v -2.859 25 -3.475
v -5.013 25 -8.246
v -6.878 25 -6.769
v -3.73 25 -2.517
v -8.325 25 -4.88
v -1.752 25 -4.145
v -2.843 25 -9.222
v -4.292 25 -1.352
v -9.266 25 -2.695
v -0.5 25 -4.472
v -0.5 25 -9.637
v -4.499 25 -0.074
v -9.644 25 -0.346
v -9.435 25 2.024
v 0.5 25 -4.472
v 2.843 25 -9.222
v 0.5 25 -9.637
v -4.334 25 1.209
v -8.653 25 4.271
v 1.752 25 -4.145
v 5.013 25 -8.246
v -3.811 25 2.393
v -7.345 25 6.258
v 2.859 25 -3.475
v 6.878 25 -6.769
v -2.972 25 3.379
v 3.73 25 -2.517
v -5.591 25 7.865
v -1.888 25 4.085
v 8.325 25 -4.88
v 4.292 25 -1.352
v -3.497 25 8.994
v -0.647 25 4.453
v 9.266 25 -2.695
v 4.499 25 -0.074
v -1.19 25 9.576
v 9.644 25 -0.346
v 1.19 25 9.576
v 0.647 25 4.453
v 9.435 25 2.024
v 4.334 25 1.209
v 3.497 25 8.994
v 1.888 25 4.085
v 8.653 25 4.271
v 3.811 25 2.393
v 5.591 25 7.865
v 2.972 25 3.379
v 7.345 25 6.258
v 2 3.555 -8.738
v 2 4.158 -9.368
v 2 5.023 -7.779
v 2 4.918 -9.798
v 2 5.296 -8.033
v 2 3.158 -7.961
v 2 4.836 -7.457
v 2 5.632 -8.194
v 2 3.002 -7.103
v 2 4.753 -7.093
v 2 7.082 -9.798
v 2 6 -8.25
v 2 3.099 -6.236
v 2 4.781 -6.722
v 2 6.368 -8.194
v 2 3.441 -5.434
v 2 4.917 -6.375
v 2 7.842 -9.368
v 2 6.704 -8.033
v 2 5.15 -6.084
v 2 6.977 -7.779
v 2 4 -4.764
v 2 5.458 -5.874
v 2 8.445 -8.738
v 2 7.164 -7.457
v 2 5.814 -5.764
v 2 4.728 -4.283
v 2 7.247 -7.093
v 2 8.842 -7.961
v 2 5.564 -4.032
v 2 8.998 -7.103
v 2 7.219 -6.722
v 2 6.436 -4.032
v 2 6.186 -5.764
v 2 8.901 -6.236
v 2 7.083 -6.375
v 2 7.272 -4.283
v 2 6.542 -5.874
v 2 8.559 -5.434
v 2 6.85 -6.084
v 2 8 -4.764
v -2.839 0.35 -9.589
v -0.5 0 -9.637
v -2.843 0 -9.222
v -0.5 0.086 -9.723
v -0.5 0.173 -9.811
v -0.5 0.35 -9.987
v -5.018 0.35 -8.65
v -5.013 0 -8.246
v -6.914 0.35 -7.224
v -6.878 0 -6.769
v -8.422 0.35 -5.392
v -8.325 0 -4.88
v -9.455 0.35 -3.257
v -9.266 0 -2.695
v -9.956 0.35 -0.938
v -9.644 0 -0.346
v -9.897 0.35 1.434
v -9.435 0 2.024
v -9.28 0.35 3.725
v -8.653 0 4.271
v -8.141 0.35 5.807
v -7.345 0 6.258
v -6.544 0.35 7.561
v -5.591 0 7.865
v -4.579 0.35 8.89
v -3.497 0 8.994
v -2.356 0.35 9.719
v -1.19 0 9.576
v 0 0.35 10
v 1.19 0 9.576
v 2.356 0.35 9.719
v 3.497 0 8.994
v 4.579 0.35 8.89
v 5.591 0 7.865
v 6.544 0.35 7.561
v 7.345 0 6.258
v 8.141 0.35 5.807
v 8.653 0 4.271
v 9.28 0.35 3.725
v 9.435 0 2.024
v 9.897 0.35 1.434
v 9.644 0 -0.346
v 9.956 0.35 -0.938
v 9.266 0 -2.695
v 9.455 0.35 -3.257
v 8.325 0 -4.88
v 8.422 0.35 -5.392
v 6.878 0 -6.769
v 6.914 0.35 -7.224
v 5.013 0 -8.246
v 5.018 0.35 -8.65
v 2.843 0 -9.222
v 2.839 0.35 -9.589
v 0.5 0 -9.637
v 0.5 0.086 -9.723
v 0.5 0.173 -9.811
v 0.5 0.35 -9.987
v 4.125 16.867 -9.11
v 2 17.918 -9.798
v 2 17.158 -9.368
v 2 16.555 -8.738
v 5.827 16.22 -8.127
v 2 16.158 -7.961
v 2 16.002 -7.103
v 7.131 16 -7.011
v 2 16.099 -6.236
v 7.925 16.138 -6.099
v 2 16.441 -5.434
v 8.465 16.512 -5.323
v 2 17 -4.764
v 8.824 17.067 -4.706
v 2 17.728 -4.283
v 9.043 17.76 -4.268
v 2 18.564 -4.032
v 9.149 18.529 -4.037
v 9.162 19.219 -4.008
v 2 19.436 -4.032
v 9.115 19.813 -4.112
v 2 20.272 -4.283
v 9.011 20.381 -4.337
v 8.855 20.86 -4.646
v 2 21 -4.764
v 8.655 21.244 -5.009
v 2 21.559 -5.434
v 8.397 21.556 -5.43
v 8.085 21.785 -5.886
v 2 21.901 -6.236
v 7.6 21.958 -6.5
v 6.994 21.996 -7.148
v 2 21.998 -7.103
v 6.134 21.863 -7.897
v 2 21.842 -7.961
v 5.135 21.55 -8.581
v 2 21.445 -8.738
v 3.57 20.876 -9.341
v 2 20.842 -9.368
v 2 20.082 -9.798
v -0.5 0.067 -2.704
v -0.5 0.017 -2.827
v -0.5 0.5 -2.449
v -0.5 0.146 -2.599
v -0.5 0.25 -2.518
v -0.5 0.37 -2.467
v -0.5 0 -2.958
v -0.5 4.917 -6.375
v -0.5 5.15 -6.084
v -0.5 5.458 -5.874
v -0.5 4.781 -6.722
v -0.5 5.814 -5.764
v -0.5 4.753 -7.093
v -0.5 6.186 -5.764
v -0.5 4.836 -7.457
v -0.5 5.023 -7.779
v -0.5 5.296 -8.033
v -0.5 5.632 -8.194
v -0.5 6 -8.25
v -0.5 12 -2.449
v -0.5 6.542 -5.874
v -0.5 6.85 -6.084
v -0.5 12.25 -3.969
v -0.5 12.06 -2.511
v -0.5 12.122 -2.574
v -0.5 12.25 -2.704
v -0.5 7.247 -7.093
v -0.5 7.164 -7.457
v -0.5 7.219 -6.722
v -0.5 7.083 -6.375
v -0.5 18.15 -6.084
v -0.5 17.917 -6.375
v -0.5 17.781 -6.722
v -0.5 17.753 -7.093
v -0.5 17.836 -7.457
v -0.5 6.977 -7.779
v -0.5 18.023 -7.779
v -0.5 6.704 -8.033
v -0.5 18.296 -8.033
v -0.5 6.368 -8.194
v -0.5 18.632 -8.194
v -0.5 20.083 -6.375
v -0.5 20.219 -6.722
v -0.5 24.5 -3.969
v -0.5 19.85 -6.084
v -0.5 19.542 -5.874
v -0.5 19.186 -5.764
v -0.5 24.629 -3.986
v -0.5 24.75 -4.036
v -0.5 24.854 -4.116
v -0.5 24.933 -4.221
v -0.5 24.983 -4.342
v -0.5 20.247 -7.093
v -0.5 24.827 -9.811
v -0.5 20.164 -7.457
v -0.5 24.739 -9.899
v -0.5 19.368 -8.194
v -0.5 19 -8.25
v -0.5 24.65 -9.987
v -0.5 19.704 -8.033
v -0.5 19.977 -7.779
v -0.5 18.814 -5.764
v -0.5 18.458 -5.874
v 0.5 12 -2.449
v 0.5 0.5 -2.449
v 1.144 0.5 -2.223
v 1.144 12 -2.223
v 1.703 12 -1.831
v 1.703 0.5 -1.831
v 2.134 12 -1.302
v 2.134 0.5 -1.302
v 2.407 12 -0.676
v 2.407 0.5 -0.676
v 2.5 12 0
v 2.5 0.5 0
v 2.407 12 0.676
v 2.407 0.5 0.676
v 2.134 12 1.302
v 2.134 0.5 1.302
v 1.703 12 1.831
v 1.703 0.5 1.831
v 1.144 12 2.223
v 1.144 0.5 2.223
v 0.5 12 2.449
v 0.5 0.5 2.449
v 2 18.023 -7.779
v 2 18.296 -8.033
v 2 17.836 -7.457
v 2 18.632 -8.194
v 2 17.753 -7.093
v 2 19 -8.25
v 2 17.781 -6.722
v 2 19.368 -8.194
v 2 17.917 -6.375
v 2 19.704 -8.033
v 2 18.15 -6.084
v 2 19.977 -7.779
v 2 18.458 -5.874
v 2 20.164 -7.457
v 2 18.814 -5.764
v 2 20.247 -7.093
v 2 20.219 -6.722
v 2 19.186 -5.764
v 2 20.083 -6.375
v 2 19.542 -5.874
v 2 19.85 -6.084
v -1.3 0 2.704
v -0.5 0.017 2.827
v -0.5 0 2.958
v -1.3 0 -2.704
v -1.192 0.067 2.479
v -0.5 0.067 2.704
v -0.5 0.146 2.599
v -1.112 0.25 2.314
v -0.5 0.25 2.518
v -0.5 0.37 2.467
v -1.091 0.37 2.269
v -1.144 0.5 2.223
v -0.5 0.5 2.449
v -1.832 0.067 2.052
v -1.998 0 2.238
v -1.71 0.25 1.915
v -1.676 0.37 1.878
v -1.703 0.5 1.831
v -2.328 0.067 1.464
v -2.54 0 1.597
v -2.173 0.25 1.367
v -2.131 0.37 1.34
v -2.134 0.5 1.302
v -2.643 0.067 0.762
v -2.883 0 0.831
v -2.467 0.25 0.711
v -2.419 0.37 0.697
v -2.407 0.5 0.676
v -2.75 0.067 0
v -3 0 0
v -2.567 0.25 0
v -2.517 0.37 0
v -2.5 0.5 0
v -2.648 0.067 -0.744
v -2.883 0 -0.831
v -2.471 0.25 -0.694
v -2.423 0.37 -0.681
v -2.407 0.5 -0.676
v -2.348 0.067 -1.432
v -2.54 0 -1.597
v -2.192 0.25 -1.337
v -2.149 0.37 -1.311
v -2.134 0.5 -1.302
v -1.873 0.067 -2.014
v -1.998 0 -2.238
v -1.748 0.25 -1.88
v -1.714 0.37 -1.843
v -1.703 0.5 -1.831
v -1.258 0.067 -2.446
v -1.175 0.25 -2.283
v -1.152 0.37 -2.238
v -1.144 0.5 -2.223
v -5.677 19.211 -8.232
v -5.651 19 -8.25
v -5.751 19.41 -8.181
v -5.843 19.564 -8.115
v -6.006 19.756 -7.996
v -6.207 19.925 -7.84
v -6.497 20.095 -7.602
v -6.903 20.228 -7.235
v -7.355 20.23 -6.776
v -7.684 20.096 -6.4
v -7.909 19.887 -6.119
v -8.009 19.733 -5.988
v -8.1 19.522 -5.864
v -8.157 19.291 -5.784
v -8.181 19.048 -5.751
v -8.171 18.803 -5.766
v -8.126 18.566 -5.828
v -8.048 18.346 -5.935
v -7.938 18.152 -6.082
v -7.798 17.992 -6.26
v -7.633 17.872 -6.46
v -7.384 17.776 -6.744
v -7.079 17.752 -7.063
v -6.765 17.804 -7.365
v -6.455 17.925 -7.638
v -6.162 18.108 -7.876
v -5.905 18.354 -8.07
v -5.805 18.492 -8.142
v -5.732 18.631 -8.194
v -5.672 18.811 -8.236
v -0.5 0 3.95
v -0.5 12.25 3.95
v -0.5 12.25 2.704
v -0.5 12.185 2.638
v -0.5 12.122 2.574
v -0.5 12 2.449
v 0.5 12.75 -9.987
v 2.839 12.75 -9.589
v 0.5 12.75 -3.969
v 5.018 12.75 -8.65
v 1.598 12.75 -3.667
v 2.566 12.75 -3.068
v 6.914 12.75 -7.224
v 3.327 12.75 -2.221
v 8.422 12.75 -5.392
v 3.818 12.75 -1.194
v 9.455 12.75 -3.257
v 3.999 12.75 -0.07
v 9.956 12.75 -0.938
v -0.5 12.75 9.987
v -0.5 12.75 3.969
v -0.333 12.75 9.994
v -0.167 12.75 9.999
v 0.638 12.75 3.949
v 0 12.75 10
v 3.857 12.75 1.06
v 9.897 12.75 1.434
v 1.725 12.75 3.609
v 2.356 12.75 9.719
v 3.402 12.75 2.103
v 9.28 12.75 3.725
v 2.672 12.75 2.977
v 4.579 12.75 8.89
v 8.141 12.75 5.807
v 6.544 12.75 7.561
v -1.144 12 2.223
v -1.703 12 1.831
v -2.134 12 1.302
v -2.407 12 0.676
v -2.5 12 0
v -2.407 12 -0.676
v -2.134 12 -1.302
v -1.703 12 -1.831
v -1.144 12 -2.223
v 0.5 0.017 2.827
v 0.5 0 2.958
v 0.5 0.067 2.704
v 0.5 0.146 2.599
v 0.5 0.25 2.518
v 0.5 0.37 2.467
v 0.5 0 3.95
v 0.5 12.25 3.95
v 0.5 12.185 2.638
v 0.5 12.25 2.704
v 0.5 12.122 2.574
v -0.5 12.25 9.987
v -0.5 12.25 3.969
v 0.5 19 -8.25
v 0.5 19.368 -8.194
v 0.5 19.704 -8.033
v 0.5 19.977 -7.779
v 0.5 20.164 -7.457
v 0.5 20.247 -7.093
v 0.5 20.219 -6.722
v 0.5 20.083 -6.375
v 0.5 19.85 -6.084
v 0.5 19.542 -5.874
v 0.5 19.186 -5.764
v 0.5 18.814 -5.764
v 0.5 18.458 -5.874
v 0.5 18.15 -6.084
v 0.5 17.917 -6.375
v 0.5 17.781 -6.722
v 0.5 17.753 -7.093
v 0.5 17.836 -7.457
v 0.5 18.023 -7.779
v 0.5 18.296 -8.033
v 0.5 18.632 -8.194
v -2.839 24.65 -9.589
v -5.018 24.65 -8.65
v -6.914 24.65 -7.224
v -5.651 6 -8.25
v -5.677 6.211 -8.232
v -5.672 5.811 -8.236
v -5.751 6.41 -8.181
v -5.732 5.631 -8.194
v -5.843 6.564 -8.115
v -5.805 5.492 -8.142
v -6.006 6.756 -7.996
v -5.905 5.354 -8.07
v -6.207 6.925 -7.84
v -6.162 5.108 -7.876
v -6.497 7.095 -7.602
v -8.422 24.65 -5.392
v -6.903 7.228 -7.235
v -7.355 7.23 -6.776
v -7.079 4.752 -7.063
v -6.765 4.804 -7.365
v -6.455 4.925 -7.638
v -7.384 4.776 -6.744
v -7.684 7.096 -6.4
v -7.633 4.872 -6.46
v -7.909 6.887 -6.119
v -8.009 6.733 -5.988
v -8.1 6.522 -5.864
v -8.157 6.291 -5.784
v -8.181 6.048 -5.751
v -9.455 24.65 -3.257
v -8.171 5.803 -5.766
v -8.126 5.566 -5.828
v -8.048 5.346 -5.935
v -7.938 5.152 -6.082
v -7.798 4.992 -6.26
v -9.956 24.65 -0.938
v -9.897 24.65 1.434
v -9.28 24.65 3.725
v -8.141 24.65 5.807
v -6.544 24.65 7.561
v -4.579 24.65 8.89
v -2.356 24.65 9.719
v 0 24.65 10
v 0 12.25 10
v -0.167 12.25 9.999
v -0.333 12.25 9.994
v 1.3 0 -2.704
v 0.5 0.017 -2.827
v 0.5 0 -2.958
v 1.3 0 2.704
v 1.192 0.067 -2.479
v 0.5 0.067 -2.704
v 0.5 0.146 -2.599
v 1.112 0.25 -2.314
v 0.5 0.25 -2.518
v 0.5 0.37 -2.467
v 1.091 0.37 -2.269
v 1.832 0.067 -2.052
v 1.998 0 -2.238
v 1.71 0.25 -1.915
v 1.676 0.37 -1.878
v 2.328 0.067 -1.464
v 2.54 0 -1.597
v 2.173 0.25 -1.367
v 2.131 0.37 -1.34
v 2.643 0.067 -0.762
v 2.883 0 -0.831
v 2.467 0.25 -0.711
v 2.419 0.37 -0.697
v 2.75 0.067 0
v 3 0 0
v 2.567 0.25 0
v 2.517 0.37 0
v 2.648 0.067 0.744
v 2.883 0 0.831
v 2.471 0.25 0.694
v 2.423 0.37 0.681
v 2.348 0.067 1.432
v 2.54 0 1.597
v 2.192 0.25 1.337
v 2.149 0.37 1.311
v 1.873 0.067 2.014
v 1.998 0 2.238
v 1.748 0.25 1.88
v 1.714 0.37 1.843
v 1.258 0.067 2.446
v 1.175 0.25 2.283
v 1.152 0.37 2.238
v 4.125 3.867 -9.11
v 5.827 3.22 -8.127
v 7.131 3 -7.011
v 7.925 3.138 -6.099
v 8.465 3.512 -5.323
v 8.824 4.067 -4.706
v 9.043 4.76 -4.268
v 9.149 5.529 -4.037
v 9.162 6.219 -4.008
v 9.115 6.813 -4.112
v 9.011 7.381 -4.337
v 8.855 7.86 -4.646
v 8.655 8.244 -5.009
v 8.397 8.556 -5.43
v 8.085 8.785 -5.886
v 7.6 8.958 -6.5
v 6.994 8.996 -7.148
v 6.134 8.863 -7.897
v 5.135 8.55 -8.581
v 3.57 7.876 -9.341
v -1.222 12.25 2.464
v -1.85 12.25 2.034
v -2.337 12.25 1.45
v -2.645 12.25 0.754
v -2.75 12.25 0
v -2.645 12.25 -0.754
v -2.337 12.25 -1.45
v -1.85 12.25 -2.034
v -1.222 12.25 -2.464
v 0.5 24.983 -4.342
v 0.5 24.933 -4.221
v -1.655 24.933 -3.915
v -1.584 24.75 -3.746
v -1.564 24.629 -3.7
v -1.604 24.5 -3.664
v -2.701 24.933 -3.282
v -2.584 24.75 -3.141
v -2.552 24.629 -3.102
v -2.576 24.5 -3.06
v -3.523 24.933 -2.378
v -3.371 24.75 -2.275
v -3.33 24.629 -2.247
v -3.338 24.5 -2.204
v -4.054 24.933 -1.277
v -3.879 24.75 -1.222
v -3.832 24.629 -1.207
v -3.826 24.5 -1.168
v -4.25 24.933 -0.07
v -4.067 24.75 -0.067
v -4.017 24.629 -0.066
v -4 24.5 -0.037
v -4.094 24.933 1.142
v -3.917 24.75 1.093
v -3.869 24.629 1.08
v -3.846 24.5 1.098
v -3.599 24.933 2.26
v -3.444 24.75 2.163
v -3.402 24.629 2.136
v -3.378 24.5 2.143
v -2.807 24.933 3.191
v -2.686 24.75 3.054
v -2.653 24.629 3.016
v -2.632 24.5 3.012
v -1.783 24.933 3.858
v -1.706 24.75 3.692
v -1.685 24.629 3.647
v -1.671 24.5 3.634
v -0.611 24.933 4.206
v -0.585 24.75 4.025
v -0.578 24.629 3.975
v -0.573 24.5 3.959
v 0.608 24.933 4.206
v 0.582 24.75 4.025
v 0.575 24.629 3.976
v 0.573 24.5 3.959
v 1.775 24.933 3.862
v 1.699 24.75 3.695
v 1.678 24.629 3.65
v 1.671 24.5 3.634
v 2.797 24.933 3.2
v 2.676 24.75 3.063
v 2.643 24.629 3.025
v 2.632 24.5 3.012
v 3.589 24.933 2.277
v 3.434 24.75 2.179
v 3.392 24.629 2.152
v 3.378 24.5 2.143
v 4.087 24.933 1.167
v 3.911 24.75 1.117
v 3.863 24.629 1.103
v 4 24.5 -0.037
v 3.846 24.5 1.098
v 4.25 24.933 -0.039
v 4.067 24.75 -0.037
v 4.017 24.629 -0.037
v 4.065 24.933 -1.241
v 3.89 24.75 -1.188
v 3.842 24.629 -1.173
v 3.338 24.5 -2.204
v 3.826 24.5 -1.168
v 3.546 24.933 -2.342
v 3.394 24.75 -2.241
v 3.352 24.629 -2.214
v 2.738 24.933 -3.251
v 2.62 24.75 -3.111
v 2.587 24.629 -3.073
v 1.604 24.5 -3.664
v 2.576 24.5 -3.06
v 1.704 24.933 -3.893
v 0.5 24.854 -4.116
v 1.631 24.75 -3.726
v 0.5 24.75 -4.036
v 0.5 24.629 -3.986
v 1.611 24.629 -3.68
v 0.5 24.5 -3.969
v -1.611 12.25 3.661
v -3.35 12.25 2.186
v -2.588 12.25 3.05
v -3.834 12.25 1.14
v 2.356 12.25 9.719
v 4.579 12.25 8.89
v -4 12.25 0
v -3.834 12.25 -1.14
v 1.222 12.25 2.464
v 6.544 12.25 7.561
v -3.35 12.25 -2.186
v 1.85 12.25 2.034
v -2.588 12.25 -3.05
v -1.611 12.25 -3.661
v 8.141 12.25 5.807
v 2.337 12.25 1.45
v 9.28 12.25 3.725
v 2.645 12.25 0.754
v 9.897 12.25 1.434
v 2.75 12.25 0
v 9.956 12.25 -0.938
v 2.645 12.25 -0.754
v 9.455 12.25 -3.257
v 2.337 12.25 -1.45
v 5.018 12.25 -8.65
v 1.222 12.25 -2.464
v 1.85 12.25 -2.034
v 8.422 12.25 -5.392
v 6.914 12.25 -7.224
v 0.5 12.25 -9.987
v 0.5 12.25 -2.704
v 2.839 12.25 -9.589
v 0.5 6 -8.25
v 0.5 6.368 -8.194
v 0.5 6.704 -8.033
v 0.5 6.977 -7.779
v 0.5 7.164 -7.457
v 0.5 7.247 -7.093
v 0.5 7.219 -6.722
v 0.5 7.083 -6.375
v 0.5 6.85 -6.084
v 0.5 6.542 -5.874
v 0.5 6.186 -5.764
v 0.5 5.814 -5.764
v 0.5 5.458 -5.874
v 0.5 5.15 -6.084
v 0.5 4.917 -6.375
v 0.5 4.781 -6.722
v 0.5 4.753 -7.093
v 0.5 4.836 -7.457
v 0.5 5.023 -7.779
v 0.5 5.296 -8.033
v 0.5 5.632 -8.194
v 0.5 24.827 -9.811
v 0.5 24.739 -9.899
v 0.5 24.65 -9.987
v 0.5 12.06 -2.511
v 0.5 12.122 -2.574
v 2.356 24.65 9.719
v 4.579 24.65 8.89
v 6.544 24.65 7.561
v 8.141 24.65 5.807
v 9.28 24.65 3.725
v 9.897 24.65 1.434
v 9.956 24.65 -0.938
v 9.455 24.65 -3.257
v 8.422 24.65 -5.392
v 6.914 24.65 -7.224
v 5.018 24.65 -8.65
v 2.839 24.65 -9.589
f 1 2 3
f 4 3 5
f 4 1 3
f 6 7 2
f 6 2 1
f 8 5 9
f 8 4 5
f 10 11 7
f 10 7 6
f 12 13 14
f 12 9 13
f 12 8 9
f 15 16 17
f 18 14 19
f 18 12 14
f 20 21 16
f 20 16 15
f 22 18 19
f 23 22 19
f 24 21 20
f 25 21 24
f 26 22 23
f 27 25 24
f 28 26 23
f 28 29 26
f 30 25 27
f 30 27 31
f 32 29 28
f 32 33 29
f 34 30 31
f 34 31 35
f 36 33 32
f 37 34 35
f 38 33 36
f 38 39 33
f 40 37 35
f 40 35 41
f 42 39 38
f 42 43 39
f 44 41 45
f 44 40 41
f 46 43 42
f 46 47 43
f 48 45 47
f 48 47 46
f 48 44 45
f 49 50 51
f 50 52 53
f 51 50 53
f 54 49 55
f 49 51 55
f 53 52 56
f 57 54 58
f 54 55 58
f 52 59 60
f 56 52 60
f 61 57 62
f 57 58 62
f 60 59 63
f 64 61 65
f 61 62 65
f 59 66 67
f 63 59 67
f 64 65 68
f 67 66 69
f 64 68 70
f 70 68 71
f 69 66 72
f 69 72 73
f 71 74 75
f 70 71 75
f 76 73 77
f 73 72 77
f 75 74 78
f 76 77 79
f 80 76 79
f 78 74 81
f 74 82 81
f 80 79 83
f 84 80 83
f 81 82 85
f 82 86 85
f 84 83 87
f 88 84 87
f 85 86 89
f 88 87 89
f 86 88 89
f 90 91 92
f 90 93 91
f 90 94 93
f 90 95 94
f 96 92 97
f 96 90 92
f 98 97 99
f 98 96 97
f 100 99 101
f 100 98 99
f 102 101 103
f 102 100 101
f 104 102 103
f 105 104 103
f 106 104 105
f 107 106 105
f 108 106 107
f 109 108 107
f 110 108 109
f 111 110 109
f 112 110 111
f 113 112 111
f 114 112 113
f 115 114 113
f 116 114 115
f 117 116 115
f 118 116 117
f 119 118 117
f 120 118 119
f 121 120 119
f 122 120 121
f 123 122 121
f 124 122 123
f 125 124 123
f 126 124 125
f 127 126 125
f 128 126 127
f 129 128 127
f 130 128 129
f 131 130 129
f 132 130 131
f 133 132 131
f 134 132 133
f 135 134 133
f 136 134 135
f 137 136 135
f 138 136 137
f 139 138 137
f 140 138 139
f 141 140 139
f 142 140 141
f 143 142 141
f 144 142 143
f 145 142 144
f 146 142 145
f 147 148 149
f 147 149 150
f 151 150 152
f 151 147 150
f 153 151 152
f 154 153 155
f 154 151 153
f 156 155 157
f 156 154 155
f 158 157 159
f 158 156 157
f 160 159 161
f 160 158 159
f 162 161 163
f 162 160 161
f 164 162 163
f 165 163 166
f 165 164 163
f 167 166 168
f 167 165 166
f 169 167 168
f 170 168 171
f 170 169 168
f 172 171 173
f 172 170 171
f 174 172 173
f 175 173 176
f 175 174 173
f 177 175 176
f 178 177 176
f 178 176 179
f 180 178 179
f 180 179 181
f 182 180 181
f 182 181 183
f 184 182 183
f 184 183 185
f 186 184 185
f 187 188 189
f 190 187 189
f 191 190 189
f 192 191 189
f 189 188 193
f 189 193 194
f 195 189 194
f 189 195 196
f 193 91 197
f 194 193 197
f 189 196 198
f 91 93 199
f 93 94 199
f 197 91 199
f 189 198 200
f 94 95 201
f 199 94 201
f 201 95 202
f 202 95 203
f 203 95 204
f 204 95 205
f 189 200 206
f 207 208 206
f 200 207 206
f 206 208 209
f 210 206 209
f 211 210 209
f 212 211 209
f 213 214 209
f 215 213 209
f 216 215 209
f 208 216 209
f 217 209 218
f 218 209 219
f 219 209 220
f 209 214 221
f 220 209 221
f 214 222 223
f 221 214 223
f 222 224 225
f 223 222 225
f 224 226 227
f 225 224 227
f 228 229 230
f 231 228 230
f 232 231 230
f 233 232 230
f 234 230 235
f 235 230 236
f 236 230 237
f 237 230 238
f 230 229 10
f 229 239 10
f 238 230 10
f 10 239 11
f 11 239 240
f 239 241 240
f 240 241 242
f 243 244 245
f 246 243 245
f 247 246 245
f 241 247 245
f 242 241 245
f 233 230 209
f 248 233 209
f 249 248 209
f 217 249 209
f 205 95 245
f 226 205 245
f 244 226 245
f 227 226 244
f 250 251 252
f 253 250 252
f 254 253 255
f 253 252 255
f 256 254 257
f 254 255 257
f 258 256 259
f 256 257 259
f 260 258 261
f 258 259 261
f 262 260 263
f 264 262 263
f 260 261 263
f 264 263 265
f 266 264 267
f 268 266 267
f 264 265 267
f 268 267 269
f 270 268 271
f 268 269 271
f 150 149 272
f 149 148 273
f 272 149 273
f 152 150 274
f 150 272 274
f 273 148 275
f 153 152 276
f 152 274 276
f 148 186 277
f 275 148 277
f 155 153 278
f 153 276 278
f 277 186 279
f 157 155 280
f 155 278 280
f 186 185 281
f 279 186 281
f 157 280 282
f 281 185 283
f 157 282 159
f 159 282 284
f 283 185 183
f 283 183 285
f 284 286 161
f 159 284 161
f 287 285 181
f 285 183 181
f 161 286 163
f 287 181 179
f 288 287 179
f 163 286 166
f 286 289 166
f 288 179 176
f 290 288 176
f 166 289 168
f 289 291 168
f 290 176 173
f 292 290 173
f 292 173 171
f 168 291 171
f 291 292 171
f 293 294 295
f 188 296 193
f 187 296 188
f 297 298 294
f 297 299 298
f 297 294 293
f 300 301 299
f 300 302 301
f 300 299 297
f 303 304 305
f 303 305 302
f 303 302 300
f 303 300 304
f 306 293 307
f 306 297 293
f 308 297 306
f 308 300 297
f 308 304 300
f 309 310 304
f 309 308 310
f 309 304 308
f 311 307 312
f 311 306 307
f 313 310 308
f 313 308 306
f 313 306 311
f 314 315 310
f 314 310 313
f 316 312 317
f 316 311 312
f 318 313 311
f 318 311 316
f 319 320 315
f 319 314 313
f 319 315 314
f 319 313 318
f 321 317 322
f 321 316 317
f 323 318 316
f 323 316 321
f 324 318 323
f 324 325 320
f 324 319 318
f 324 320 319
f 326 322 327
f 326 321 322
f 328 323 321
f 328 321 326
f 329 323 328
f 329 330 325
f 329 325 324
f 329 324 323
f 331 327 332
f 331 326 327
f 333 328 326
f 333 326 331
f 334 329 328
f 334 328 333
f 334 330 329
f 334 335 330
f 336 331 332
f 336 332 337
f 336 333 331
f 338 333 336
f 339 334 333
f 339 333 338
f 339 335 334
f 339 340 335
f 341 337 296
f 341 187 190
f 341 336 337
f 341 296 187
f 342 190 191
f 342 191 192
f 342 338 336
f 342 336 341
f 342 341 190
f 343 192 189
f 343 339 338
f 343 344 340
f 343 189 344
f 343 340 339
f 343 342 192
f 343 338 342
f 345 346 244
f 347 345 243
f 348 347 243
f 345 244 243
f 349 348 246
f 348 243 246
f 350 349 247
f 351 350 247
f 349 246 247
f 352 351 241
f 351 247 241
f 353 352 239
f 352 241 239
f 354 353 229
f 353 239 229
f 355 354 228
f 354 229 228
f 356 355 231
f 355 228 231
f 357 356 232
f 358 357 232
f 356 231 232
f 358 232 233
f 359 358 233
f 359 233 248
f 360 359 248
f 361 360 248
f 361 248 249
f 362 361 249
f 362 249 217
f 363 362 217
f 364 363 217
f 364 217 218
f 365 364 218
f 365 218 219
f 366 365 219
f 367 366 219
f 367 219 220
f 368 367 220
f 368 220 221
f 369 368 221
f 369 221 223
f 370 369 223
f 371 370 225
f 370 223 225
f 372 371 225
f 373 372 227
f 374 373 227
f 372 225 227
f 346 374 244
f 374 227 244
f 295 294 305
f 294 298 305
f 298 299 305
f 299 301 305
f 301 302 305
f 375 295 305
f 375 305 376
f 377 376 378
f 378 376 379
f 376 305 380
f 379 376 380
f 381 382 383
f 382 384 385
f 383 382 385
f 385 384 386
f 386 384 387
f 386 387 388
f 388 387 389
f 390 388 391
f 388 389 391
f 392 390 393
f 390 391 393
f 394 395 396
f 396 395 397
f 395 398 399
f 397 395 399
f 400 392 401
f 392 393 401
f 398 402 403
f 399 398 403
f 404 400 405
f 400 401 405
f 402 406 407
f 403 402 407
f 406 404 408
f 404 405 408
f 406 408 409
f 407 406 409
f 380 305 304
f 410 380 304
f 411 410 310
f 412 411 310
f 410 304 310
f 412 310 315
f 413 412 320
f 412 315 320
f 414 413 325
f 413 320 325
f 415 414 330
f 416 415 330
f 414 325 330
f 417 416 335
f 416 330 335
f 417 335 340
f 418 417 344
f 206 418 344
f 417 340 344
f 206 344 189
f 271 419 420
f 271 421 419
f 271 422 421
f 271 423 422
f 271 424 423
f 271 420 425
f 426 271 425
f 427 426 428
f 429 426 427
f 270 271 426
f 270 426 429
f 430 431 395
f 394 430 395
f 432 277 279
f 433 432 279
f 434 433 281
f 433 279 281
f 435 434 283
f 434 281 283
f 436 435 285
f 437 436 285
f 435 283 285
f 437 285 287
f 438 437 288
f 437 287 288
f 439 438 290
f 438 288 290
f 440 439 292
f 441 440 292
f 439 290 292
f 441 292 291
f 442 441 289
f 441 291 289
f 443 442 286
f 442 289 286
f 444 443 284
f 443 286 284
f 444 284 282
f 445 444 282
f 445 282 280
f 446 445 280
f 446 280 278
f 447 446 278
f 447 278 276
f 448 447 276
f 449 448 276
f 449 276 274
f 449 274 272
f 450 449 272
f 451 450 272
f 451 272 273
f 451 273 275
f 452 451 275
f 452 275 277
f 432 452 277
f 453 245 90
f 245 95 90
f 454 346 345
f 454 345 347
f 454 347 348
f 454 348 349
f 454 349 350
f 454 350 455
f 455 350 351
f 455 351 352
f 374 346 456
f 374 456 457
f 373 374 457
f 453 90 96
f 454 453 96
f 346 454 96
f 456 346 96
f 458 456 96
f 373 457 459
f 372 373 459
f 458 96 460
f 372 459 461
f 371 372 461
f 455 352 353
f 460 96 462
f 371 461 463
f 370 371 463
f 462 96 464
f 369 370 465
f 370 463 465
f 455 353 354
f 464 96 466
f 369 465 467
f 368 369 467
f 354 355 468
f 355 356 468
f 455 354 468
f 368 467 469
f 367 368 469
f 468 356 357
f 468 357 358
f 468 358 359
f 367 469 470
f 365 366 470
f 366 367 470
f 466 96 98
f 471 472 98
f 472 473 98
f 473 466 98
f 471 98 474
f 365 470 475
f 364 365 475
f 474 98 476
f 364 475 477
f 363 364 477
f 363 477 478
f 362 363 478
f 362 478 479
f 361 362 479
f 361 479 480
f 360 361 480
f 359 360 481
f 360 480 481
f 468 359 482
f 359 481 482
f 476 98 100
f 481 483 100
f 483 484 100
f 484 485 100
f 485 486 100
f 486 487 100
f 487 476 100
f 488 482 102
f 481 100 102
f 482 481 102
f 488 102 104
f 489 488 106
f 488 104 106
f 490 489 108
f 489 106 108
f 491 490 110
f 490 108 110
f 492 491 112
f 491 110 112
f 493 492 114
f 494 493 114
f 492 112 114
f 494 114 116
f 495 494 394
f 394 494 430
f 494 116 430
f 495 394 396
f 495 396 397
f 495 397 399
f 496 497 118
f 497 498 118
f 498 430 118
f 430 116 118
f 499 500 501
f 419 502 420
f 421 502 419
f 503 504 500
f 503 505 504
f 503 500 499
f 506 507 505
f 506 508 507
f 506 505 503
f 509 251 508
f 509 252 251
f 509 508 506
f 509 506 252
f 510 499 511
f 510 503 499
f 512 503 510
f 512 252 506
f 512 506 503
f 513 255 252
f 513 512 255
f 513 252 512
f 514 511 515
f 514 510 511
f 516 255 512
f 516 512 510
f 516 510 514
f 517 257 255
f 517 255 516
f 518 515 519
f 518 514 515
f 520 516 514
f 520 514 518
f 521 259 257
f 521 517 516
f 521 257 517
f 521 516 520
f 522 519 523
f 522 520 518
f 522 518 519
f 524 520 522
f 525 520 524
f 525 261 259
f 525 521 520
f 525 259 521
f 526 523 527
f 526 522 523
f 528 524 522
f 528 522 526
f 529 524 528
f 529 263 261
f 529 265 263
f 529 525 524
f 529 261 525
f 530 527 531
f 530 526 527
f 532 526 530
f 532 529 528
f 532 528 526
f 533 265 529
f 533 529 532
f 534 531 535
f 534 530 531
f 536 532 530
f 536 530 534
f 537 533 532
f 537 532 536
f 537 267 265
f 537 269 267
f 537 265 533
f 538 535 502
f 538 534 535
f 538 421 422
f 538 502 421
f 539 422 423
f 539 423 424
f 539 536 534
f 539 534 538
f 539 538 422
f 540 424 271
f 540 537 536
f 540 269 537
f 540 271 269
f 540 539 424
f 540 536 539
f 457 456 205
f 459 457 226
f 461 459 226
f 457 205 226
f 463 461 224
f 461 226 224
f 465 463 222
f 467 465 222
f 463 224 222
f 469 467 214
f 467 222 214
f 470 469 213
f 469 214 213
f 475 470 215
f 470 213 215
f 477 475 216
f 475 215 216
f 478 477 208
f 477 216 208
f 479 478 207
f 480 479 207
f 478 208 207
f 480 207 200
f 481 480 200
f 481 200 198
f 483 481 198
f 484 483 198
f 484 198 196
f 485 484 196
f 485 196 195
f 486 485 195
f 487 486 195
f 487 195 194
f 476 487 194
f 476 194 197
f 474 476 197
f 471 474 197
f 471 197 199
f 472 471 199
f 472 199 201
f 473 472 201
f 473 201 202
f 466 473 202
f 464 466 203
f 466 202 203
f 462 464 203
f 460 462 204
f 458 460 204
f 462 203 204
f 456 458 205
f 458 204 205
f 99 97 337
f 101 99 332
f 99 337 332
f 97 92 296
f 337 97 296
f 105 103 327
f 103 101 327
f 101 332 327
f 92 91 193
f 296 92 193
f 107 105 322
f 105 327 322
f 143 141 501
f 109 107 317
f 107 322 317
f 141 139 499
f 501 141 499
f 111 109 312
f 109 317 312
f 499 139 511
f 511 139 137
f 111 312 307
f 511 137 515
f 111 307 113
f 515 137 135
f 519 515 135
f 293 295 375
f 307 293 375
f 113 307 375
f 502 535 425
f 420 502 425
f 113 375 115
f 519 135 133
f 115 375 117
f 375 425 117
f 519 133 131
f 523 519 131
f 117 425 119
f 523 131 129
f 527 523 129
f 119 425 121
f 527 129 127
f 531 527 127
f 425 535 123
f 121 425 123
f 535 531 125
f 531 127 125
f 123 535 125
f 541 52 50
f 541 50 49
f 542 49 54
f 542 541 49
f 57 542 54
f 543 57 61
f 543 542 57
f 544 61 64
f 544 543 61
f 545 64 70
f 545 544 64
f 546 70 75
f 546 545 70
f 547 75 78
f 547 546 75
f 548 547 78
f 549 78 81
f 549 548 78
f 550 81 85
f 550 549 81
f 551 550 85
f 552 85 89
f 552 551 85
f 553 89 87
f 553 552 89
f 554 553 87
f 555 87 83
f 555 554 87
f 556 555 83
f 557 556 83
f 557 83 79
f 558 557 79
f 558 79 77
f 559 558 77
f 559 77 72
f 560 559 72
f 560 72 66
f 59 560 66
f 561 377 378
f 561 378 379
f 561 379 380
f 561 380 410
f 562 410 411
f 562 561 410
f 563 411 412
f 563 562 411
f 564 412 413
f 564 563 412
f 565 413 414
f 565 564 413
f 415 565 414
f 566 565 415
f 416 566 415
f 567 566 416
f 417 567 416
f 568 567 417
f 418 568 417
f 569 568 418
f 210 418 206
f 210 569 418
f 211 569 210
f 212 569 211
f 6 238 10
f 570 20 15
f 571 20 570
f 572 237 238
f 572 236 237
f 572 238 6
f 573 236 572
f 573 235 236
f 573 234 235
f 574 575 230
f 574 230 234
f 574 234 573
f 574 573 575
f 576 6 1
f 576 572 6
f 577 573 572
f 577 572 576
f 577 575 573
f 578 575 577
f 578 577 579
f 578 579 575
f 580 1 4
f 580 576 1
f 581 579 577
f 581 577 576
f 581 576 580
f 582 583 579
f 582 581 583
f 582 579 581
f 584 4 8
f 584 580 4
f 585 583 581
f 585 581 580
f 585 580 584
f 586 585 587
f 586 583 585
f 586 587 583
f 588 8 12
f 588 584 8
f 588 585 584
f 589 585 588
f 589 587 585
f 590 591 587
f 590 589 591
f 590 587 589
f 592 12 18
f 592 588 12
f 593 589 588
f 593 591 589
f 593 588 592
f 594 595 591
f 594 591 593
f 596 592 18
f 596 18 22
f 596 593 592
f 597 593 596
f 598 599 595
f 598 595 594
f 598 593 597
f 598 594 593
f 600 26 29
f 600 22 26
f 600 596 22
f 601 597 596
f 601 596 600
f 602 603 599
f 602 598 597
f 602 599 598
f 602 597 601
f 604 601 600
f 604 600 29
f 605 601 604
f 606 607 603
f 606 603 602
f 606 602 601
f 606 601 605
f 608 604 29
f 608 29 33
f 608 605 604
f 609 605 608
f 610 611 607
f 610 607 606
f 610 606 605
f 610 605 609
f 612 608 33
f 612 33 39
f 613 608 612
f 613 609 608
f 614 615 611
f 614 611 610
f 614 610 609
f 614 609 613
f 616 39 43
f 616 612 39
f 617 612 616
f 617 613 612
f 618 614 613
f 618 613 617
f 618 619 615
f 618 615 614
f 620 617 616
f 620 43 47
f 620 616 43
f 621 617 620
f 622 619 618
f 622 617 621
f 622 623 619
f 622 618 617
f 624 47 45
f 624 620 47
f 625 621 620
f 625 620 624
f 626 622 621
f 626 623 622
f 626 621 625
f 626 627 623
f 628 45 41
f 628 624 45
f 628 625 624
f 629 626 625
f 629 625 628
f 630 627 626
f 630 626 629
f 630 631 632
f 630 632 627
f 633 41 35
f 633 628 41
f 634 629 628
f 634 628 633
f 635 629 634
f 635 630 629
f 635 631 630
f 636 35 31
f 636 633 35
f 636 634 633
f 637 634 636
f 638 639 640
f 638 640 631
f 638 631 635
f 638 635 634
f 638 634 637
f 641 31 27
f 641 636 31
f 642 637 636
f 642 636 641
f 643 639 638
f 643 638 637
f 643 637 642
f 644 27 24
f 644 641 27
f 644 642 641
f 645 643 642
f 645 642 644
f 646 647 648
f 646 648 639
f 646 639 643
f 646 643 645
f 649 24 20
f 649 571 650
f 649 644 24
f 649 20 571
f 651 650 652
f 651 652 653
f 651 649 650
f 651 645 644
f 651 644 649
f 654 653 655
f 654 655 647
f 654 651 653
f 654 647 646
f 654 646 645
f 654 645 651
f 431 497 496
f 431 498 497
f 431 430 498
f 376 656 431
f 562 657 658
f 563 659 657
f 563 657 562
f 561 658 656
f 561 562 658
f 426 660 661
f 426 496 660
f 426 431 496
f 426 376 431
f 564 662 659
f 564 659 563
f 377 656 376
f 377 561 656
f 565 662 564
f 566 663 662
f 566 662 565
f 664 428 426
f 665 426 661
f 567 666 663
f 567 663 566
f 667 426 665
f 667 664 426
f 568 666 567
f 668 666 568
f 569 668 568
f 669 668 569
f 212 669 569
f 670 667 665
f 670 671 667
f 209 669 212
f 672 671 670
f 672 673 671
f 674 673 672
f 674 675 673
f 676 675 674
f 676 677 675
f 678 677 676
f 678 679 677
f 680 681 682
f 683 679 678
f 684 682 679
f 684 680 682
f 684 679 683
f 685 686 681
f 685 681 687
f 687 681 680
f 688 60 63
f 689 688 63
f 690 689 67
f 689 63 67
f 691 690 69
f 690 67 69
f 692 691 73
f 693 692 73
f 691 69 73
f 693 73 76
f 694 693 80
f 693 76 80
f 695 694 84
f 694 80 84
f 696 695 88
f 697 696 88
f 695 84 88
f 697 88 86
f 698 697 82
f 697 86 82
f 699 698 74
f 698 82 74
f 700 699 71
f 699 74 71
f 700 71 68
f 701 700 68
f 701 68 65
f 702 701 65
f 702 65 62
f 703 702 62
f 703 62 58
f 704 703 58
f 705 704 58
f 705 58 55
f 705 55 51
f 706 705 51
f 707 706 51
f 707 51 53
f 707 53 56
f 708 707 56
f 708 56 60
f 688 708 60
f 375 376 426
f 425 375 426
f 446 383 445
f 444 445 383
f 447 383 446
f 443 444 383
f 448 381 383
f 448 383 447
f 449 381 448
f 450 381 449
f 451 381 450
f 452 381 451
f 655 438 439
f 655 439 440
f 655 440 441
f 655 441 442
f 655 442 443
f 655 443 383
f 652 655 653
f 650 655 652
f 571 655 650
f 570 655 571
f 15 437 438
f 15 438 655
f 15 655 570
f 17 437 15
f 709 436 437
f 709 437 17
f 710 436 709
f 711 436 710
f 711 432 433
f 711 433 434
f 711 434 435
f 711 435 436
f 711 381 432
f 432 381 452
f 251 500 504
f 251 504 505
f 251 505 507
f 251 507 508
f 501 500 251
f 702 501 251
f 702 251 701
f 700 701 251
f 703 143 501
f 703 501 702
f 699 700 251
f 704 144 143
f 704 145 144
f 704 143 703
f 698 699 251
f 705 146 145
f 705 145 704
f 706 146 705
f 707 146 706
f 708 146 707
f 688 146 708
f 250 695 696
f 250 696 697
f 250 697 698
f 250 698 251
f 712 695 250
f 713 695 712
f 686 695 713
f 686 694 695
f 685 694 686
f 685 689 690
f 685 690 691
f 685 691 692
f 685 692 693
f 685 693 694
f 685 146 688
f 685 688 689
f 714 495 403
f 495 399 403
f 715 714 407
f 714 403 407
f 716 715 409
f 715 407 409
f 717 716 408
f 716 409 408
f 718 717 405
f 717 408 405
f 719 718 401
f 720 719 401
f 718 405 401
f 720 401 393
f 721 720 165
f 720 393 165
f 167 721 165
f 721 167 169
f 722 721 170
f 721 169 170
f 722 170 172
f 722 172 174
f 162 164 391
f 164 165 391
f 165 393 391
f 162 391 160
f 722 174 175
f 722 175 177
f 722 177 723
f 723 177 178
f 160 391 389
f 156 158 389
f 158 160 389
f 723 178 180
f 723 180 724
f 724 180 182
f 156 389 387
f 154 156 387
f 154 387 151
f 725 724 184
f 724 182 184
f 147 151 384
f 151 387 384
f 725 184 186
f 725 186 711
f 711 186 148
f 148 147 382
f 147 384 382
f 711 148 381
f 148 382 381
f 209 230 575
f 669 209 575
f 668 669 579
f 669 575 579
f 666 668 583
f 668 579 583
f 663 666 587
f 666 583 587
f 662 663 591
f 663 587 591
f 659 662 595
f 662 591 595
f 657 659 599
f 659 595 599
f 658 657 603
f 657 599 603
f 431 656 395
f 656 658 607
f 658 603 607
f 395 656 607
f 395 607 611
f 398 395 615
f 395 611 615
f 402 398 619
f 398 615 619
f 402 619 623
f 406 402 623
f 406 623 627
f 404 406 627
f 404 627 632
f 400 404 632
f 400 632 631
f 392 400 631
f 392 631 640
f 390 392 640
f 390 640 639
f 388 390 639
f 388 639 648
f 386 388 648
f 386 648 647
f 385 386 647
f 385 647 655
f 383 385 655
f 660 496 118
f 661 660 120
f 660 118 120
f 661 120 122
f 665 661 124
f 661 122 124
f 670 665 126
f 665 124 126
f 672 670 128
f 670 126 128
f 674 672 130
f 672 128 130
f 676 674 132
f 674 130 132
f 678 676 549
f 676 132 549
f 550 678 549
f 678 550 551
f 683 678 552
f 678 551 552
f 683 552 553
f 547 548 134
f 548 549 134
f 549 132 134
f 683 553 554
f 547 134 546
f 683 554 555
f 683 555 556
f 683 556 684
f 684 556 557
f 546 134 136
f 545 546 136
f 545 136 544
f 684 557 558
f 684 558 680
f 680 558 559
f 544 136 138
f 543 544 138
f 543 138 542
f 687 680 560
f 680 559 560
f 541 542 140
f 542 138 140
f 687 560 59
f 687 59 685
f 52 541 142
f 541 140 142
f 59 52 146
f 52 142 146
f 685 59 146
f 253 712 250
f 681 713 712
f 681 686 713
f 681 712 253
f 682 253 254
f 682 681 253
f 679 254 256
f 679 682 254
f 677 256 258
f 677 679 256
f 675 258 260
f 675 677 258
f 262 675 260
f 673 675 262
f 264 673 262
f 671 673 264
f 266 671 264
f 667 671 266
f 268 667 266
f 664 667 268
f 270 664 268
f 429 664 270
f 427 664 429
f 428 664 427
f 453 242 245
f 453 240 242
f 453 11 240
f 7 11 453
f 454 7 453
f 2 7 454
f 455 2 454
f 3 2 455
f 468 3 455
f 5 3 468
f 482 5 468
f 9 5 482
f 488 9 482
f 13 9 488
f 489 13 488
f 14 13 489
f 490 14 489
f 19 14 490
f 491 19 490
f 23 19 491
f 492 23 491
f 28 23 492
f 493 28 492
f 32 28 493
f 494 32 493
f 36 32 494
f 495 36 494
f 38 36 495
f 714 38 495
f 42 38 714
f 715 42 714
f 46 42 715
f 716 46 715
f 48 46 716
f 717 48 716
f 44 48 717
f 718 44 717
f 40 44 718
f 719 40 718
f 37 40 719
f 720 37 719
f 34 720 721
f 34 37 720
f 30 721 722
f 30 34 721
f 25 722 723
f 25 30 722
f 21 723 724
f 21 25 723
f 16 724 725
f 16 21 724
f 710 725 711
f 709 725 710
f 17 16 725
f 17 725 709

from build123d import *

# Parameters (mm, degrees)
SKETCH1_R           = 10
BOSS_EXTRUDE1_DEPTH = 25
SKETCH2_R           = 4
CUT_EXTRUDE1_DEPTH  = 12.5
SKETCH3_R           = 2.5
CUT_EXTRUDE2_DEPTH  = 12.5
FILLET1_R           = 0.5
CHAMFER2_SIZE       = 0.5
CHAMFER3_SIZE       = 0.35
SKETCH4_R           = 3
CUT_EXTRUDE3_DEPTH  = 8
SKETCH5_R           = 1.25
CUT_EXTRUDE4_DEPTH  = 30.478806021
SKETCH6_W           = 1
SKETCH6_H           = 25
CUT_EXTRUDE5_DEPTH  = 13.95
SKETCH7_W           = 20.006481037
SKETCH7_H           = 0.5
CUT_EXTRUDE6_DEPTH  = 10.5
CUT_EXTRUDE7_START  = 13.975
SKETCH8_R           = 4
CUT_EXTRUDE7_DEPTH  = 13.975


with BuildPart() as part:
    # Sketch1 → Boss-Extrude1 (new body)
    with BuildSketch(Plane(origin=(0, 0, 0), x_dir=(1, 0, 0), z_dir=(0, 1, 0))):
        with Locations(Location((0, 0, 0), (0, 0, 270))):
            Circle(SKETCH1_R)
    extrude(amount=BOSS_EXTRUDE1_DEPTH)

    # Sketch2 → Cut-Extrude1 (cut)
    with BuildSketch(Plane(origin=(0, 25, 0), x_dir=(1, 0, 0), z_dir=(0, 1, 0))):
        with Locations(Location((0, 0, 0), (0, 0, 270))):
            Circle(SKETCH2_R)
    extrude(amount=-CUT_EXTRUDE1_DEPTH, mode=Mode.SUBTRACT)

    # Sketch3 → Cut-Extrude2 (cut)
    with BuildSketch(Plane.XZ):
        with Locations(Location((0, 0, 0), (0, 0, 270))):
            Circle(SKETCH3_R)
    extrude(amount=-CUT_EXTRUDE2_DEPTH, mode=Mode.SUBTRACT)

    # Fillet1
    fillet1_edges = [part.edges().sort_by_distance(p)[0] for p in [
        (0, 0, 2.5),
        (0, 25, -4),
    ]]
    fillet(fillet1_edges, radius=FILLET1_R)

    # Chamfer2
    chamfer2_edges = [part.edges().sort_by_distance(p)[0] for p in [
        (0, 12.5, 2.5),
    ]]
    chamfer(chamfer2_edges, length=CHAMFER2_SIZE)

    # Chamfer3
    chamfer3_edges = [part.edges().sort_by_distance(p)[0] for p in [
        (0, 0, -10),
        (0, 25, -10),
    ]]
    chamfer(chamfer3_edges, length=CHAMFER3_SIZE)

    # Sketch4 → Cut-Extrude3 (cut)
    with BuildSketch(Plane.ZY.offset(-10)):
        with Locations((-7, 19)):
            Circle(SKETCH4_R)
        with Locations((-7, 6)):
            Circle(SKETCH4_R)
    extrude(amount=CUT_EXTRUDE3_DEPTH, mode=Mode.SUBTRACT)

    # Sketch5 → Cut-Extrude4 (cut, through all)
    with BuildSketch(Plane(origin=(2, 0, 0), x_dir=(0, 0, -1), z_dir=(1, 0, 0))):
        with Locations((7, 19)):
            Circle(SKETCH5_R)
        with Locations((7, 6)):
            Circle(SKETCH5_R)
    extrude(amount=-CUT_EXTRUDE4_DEPTH, mode=Mode.SUBTRACT)

    # Sketch6 → Cut-Extrude5 (cut)
    with BuildSketch(Plane.XY.offset(-10)):
        with Locations((0, 12.5)):
            Rectangle(SKETCH6_W, SKETCH6_H)
    extrude(amount=CUT_EXTRUDE5_DEPTH, mode=Mode.SUBTRACT)

    # Sketch7 → Cut-Extrude6 (cut)
    with BuildSketch(Plane.ZY.offset(-10)):
        with Locations((0.003240519, 12.5)):
            Rectangle(SKETCH7_W, SKETCH7_H)
    extrude(amount=CUT_EXTRUDE6_DEPTH, mode=Mode.SUBTRACT)

    # Sketch8 → Cut-Extrude7 (cut)
    with BuildSketch(Plane(origin=(0, 12.25, 0), x_dir=(1, 0, 0), z_dir=(0, 1, 0)).offset(CUT_EXTRUDE7_START)):
        Circle(SKETCH8_R)
    extrude(amount=-CUT_EXTRUDE7_DEPTH, mode=Mode.SUBTRACT)


solid = part.part
